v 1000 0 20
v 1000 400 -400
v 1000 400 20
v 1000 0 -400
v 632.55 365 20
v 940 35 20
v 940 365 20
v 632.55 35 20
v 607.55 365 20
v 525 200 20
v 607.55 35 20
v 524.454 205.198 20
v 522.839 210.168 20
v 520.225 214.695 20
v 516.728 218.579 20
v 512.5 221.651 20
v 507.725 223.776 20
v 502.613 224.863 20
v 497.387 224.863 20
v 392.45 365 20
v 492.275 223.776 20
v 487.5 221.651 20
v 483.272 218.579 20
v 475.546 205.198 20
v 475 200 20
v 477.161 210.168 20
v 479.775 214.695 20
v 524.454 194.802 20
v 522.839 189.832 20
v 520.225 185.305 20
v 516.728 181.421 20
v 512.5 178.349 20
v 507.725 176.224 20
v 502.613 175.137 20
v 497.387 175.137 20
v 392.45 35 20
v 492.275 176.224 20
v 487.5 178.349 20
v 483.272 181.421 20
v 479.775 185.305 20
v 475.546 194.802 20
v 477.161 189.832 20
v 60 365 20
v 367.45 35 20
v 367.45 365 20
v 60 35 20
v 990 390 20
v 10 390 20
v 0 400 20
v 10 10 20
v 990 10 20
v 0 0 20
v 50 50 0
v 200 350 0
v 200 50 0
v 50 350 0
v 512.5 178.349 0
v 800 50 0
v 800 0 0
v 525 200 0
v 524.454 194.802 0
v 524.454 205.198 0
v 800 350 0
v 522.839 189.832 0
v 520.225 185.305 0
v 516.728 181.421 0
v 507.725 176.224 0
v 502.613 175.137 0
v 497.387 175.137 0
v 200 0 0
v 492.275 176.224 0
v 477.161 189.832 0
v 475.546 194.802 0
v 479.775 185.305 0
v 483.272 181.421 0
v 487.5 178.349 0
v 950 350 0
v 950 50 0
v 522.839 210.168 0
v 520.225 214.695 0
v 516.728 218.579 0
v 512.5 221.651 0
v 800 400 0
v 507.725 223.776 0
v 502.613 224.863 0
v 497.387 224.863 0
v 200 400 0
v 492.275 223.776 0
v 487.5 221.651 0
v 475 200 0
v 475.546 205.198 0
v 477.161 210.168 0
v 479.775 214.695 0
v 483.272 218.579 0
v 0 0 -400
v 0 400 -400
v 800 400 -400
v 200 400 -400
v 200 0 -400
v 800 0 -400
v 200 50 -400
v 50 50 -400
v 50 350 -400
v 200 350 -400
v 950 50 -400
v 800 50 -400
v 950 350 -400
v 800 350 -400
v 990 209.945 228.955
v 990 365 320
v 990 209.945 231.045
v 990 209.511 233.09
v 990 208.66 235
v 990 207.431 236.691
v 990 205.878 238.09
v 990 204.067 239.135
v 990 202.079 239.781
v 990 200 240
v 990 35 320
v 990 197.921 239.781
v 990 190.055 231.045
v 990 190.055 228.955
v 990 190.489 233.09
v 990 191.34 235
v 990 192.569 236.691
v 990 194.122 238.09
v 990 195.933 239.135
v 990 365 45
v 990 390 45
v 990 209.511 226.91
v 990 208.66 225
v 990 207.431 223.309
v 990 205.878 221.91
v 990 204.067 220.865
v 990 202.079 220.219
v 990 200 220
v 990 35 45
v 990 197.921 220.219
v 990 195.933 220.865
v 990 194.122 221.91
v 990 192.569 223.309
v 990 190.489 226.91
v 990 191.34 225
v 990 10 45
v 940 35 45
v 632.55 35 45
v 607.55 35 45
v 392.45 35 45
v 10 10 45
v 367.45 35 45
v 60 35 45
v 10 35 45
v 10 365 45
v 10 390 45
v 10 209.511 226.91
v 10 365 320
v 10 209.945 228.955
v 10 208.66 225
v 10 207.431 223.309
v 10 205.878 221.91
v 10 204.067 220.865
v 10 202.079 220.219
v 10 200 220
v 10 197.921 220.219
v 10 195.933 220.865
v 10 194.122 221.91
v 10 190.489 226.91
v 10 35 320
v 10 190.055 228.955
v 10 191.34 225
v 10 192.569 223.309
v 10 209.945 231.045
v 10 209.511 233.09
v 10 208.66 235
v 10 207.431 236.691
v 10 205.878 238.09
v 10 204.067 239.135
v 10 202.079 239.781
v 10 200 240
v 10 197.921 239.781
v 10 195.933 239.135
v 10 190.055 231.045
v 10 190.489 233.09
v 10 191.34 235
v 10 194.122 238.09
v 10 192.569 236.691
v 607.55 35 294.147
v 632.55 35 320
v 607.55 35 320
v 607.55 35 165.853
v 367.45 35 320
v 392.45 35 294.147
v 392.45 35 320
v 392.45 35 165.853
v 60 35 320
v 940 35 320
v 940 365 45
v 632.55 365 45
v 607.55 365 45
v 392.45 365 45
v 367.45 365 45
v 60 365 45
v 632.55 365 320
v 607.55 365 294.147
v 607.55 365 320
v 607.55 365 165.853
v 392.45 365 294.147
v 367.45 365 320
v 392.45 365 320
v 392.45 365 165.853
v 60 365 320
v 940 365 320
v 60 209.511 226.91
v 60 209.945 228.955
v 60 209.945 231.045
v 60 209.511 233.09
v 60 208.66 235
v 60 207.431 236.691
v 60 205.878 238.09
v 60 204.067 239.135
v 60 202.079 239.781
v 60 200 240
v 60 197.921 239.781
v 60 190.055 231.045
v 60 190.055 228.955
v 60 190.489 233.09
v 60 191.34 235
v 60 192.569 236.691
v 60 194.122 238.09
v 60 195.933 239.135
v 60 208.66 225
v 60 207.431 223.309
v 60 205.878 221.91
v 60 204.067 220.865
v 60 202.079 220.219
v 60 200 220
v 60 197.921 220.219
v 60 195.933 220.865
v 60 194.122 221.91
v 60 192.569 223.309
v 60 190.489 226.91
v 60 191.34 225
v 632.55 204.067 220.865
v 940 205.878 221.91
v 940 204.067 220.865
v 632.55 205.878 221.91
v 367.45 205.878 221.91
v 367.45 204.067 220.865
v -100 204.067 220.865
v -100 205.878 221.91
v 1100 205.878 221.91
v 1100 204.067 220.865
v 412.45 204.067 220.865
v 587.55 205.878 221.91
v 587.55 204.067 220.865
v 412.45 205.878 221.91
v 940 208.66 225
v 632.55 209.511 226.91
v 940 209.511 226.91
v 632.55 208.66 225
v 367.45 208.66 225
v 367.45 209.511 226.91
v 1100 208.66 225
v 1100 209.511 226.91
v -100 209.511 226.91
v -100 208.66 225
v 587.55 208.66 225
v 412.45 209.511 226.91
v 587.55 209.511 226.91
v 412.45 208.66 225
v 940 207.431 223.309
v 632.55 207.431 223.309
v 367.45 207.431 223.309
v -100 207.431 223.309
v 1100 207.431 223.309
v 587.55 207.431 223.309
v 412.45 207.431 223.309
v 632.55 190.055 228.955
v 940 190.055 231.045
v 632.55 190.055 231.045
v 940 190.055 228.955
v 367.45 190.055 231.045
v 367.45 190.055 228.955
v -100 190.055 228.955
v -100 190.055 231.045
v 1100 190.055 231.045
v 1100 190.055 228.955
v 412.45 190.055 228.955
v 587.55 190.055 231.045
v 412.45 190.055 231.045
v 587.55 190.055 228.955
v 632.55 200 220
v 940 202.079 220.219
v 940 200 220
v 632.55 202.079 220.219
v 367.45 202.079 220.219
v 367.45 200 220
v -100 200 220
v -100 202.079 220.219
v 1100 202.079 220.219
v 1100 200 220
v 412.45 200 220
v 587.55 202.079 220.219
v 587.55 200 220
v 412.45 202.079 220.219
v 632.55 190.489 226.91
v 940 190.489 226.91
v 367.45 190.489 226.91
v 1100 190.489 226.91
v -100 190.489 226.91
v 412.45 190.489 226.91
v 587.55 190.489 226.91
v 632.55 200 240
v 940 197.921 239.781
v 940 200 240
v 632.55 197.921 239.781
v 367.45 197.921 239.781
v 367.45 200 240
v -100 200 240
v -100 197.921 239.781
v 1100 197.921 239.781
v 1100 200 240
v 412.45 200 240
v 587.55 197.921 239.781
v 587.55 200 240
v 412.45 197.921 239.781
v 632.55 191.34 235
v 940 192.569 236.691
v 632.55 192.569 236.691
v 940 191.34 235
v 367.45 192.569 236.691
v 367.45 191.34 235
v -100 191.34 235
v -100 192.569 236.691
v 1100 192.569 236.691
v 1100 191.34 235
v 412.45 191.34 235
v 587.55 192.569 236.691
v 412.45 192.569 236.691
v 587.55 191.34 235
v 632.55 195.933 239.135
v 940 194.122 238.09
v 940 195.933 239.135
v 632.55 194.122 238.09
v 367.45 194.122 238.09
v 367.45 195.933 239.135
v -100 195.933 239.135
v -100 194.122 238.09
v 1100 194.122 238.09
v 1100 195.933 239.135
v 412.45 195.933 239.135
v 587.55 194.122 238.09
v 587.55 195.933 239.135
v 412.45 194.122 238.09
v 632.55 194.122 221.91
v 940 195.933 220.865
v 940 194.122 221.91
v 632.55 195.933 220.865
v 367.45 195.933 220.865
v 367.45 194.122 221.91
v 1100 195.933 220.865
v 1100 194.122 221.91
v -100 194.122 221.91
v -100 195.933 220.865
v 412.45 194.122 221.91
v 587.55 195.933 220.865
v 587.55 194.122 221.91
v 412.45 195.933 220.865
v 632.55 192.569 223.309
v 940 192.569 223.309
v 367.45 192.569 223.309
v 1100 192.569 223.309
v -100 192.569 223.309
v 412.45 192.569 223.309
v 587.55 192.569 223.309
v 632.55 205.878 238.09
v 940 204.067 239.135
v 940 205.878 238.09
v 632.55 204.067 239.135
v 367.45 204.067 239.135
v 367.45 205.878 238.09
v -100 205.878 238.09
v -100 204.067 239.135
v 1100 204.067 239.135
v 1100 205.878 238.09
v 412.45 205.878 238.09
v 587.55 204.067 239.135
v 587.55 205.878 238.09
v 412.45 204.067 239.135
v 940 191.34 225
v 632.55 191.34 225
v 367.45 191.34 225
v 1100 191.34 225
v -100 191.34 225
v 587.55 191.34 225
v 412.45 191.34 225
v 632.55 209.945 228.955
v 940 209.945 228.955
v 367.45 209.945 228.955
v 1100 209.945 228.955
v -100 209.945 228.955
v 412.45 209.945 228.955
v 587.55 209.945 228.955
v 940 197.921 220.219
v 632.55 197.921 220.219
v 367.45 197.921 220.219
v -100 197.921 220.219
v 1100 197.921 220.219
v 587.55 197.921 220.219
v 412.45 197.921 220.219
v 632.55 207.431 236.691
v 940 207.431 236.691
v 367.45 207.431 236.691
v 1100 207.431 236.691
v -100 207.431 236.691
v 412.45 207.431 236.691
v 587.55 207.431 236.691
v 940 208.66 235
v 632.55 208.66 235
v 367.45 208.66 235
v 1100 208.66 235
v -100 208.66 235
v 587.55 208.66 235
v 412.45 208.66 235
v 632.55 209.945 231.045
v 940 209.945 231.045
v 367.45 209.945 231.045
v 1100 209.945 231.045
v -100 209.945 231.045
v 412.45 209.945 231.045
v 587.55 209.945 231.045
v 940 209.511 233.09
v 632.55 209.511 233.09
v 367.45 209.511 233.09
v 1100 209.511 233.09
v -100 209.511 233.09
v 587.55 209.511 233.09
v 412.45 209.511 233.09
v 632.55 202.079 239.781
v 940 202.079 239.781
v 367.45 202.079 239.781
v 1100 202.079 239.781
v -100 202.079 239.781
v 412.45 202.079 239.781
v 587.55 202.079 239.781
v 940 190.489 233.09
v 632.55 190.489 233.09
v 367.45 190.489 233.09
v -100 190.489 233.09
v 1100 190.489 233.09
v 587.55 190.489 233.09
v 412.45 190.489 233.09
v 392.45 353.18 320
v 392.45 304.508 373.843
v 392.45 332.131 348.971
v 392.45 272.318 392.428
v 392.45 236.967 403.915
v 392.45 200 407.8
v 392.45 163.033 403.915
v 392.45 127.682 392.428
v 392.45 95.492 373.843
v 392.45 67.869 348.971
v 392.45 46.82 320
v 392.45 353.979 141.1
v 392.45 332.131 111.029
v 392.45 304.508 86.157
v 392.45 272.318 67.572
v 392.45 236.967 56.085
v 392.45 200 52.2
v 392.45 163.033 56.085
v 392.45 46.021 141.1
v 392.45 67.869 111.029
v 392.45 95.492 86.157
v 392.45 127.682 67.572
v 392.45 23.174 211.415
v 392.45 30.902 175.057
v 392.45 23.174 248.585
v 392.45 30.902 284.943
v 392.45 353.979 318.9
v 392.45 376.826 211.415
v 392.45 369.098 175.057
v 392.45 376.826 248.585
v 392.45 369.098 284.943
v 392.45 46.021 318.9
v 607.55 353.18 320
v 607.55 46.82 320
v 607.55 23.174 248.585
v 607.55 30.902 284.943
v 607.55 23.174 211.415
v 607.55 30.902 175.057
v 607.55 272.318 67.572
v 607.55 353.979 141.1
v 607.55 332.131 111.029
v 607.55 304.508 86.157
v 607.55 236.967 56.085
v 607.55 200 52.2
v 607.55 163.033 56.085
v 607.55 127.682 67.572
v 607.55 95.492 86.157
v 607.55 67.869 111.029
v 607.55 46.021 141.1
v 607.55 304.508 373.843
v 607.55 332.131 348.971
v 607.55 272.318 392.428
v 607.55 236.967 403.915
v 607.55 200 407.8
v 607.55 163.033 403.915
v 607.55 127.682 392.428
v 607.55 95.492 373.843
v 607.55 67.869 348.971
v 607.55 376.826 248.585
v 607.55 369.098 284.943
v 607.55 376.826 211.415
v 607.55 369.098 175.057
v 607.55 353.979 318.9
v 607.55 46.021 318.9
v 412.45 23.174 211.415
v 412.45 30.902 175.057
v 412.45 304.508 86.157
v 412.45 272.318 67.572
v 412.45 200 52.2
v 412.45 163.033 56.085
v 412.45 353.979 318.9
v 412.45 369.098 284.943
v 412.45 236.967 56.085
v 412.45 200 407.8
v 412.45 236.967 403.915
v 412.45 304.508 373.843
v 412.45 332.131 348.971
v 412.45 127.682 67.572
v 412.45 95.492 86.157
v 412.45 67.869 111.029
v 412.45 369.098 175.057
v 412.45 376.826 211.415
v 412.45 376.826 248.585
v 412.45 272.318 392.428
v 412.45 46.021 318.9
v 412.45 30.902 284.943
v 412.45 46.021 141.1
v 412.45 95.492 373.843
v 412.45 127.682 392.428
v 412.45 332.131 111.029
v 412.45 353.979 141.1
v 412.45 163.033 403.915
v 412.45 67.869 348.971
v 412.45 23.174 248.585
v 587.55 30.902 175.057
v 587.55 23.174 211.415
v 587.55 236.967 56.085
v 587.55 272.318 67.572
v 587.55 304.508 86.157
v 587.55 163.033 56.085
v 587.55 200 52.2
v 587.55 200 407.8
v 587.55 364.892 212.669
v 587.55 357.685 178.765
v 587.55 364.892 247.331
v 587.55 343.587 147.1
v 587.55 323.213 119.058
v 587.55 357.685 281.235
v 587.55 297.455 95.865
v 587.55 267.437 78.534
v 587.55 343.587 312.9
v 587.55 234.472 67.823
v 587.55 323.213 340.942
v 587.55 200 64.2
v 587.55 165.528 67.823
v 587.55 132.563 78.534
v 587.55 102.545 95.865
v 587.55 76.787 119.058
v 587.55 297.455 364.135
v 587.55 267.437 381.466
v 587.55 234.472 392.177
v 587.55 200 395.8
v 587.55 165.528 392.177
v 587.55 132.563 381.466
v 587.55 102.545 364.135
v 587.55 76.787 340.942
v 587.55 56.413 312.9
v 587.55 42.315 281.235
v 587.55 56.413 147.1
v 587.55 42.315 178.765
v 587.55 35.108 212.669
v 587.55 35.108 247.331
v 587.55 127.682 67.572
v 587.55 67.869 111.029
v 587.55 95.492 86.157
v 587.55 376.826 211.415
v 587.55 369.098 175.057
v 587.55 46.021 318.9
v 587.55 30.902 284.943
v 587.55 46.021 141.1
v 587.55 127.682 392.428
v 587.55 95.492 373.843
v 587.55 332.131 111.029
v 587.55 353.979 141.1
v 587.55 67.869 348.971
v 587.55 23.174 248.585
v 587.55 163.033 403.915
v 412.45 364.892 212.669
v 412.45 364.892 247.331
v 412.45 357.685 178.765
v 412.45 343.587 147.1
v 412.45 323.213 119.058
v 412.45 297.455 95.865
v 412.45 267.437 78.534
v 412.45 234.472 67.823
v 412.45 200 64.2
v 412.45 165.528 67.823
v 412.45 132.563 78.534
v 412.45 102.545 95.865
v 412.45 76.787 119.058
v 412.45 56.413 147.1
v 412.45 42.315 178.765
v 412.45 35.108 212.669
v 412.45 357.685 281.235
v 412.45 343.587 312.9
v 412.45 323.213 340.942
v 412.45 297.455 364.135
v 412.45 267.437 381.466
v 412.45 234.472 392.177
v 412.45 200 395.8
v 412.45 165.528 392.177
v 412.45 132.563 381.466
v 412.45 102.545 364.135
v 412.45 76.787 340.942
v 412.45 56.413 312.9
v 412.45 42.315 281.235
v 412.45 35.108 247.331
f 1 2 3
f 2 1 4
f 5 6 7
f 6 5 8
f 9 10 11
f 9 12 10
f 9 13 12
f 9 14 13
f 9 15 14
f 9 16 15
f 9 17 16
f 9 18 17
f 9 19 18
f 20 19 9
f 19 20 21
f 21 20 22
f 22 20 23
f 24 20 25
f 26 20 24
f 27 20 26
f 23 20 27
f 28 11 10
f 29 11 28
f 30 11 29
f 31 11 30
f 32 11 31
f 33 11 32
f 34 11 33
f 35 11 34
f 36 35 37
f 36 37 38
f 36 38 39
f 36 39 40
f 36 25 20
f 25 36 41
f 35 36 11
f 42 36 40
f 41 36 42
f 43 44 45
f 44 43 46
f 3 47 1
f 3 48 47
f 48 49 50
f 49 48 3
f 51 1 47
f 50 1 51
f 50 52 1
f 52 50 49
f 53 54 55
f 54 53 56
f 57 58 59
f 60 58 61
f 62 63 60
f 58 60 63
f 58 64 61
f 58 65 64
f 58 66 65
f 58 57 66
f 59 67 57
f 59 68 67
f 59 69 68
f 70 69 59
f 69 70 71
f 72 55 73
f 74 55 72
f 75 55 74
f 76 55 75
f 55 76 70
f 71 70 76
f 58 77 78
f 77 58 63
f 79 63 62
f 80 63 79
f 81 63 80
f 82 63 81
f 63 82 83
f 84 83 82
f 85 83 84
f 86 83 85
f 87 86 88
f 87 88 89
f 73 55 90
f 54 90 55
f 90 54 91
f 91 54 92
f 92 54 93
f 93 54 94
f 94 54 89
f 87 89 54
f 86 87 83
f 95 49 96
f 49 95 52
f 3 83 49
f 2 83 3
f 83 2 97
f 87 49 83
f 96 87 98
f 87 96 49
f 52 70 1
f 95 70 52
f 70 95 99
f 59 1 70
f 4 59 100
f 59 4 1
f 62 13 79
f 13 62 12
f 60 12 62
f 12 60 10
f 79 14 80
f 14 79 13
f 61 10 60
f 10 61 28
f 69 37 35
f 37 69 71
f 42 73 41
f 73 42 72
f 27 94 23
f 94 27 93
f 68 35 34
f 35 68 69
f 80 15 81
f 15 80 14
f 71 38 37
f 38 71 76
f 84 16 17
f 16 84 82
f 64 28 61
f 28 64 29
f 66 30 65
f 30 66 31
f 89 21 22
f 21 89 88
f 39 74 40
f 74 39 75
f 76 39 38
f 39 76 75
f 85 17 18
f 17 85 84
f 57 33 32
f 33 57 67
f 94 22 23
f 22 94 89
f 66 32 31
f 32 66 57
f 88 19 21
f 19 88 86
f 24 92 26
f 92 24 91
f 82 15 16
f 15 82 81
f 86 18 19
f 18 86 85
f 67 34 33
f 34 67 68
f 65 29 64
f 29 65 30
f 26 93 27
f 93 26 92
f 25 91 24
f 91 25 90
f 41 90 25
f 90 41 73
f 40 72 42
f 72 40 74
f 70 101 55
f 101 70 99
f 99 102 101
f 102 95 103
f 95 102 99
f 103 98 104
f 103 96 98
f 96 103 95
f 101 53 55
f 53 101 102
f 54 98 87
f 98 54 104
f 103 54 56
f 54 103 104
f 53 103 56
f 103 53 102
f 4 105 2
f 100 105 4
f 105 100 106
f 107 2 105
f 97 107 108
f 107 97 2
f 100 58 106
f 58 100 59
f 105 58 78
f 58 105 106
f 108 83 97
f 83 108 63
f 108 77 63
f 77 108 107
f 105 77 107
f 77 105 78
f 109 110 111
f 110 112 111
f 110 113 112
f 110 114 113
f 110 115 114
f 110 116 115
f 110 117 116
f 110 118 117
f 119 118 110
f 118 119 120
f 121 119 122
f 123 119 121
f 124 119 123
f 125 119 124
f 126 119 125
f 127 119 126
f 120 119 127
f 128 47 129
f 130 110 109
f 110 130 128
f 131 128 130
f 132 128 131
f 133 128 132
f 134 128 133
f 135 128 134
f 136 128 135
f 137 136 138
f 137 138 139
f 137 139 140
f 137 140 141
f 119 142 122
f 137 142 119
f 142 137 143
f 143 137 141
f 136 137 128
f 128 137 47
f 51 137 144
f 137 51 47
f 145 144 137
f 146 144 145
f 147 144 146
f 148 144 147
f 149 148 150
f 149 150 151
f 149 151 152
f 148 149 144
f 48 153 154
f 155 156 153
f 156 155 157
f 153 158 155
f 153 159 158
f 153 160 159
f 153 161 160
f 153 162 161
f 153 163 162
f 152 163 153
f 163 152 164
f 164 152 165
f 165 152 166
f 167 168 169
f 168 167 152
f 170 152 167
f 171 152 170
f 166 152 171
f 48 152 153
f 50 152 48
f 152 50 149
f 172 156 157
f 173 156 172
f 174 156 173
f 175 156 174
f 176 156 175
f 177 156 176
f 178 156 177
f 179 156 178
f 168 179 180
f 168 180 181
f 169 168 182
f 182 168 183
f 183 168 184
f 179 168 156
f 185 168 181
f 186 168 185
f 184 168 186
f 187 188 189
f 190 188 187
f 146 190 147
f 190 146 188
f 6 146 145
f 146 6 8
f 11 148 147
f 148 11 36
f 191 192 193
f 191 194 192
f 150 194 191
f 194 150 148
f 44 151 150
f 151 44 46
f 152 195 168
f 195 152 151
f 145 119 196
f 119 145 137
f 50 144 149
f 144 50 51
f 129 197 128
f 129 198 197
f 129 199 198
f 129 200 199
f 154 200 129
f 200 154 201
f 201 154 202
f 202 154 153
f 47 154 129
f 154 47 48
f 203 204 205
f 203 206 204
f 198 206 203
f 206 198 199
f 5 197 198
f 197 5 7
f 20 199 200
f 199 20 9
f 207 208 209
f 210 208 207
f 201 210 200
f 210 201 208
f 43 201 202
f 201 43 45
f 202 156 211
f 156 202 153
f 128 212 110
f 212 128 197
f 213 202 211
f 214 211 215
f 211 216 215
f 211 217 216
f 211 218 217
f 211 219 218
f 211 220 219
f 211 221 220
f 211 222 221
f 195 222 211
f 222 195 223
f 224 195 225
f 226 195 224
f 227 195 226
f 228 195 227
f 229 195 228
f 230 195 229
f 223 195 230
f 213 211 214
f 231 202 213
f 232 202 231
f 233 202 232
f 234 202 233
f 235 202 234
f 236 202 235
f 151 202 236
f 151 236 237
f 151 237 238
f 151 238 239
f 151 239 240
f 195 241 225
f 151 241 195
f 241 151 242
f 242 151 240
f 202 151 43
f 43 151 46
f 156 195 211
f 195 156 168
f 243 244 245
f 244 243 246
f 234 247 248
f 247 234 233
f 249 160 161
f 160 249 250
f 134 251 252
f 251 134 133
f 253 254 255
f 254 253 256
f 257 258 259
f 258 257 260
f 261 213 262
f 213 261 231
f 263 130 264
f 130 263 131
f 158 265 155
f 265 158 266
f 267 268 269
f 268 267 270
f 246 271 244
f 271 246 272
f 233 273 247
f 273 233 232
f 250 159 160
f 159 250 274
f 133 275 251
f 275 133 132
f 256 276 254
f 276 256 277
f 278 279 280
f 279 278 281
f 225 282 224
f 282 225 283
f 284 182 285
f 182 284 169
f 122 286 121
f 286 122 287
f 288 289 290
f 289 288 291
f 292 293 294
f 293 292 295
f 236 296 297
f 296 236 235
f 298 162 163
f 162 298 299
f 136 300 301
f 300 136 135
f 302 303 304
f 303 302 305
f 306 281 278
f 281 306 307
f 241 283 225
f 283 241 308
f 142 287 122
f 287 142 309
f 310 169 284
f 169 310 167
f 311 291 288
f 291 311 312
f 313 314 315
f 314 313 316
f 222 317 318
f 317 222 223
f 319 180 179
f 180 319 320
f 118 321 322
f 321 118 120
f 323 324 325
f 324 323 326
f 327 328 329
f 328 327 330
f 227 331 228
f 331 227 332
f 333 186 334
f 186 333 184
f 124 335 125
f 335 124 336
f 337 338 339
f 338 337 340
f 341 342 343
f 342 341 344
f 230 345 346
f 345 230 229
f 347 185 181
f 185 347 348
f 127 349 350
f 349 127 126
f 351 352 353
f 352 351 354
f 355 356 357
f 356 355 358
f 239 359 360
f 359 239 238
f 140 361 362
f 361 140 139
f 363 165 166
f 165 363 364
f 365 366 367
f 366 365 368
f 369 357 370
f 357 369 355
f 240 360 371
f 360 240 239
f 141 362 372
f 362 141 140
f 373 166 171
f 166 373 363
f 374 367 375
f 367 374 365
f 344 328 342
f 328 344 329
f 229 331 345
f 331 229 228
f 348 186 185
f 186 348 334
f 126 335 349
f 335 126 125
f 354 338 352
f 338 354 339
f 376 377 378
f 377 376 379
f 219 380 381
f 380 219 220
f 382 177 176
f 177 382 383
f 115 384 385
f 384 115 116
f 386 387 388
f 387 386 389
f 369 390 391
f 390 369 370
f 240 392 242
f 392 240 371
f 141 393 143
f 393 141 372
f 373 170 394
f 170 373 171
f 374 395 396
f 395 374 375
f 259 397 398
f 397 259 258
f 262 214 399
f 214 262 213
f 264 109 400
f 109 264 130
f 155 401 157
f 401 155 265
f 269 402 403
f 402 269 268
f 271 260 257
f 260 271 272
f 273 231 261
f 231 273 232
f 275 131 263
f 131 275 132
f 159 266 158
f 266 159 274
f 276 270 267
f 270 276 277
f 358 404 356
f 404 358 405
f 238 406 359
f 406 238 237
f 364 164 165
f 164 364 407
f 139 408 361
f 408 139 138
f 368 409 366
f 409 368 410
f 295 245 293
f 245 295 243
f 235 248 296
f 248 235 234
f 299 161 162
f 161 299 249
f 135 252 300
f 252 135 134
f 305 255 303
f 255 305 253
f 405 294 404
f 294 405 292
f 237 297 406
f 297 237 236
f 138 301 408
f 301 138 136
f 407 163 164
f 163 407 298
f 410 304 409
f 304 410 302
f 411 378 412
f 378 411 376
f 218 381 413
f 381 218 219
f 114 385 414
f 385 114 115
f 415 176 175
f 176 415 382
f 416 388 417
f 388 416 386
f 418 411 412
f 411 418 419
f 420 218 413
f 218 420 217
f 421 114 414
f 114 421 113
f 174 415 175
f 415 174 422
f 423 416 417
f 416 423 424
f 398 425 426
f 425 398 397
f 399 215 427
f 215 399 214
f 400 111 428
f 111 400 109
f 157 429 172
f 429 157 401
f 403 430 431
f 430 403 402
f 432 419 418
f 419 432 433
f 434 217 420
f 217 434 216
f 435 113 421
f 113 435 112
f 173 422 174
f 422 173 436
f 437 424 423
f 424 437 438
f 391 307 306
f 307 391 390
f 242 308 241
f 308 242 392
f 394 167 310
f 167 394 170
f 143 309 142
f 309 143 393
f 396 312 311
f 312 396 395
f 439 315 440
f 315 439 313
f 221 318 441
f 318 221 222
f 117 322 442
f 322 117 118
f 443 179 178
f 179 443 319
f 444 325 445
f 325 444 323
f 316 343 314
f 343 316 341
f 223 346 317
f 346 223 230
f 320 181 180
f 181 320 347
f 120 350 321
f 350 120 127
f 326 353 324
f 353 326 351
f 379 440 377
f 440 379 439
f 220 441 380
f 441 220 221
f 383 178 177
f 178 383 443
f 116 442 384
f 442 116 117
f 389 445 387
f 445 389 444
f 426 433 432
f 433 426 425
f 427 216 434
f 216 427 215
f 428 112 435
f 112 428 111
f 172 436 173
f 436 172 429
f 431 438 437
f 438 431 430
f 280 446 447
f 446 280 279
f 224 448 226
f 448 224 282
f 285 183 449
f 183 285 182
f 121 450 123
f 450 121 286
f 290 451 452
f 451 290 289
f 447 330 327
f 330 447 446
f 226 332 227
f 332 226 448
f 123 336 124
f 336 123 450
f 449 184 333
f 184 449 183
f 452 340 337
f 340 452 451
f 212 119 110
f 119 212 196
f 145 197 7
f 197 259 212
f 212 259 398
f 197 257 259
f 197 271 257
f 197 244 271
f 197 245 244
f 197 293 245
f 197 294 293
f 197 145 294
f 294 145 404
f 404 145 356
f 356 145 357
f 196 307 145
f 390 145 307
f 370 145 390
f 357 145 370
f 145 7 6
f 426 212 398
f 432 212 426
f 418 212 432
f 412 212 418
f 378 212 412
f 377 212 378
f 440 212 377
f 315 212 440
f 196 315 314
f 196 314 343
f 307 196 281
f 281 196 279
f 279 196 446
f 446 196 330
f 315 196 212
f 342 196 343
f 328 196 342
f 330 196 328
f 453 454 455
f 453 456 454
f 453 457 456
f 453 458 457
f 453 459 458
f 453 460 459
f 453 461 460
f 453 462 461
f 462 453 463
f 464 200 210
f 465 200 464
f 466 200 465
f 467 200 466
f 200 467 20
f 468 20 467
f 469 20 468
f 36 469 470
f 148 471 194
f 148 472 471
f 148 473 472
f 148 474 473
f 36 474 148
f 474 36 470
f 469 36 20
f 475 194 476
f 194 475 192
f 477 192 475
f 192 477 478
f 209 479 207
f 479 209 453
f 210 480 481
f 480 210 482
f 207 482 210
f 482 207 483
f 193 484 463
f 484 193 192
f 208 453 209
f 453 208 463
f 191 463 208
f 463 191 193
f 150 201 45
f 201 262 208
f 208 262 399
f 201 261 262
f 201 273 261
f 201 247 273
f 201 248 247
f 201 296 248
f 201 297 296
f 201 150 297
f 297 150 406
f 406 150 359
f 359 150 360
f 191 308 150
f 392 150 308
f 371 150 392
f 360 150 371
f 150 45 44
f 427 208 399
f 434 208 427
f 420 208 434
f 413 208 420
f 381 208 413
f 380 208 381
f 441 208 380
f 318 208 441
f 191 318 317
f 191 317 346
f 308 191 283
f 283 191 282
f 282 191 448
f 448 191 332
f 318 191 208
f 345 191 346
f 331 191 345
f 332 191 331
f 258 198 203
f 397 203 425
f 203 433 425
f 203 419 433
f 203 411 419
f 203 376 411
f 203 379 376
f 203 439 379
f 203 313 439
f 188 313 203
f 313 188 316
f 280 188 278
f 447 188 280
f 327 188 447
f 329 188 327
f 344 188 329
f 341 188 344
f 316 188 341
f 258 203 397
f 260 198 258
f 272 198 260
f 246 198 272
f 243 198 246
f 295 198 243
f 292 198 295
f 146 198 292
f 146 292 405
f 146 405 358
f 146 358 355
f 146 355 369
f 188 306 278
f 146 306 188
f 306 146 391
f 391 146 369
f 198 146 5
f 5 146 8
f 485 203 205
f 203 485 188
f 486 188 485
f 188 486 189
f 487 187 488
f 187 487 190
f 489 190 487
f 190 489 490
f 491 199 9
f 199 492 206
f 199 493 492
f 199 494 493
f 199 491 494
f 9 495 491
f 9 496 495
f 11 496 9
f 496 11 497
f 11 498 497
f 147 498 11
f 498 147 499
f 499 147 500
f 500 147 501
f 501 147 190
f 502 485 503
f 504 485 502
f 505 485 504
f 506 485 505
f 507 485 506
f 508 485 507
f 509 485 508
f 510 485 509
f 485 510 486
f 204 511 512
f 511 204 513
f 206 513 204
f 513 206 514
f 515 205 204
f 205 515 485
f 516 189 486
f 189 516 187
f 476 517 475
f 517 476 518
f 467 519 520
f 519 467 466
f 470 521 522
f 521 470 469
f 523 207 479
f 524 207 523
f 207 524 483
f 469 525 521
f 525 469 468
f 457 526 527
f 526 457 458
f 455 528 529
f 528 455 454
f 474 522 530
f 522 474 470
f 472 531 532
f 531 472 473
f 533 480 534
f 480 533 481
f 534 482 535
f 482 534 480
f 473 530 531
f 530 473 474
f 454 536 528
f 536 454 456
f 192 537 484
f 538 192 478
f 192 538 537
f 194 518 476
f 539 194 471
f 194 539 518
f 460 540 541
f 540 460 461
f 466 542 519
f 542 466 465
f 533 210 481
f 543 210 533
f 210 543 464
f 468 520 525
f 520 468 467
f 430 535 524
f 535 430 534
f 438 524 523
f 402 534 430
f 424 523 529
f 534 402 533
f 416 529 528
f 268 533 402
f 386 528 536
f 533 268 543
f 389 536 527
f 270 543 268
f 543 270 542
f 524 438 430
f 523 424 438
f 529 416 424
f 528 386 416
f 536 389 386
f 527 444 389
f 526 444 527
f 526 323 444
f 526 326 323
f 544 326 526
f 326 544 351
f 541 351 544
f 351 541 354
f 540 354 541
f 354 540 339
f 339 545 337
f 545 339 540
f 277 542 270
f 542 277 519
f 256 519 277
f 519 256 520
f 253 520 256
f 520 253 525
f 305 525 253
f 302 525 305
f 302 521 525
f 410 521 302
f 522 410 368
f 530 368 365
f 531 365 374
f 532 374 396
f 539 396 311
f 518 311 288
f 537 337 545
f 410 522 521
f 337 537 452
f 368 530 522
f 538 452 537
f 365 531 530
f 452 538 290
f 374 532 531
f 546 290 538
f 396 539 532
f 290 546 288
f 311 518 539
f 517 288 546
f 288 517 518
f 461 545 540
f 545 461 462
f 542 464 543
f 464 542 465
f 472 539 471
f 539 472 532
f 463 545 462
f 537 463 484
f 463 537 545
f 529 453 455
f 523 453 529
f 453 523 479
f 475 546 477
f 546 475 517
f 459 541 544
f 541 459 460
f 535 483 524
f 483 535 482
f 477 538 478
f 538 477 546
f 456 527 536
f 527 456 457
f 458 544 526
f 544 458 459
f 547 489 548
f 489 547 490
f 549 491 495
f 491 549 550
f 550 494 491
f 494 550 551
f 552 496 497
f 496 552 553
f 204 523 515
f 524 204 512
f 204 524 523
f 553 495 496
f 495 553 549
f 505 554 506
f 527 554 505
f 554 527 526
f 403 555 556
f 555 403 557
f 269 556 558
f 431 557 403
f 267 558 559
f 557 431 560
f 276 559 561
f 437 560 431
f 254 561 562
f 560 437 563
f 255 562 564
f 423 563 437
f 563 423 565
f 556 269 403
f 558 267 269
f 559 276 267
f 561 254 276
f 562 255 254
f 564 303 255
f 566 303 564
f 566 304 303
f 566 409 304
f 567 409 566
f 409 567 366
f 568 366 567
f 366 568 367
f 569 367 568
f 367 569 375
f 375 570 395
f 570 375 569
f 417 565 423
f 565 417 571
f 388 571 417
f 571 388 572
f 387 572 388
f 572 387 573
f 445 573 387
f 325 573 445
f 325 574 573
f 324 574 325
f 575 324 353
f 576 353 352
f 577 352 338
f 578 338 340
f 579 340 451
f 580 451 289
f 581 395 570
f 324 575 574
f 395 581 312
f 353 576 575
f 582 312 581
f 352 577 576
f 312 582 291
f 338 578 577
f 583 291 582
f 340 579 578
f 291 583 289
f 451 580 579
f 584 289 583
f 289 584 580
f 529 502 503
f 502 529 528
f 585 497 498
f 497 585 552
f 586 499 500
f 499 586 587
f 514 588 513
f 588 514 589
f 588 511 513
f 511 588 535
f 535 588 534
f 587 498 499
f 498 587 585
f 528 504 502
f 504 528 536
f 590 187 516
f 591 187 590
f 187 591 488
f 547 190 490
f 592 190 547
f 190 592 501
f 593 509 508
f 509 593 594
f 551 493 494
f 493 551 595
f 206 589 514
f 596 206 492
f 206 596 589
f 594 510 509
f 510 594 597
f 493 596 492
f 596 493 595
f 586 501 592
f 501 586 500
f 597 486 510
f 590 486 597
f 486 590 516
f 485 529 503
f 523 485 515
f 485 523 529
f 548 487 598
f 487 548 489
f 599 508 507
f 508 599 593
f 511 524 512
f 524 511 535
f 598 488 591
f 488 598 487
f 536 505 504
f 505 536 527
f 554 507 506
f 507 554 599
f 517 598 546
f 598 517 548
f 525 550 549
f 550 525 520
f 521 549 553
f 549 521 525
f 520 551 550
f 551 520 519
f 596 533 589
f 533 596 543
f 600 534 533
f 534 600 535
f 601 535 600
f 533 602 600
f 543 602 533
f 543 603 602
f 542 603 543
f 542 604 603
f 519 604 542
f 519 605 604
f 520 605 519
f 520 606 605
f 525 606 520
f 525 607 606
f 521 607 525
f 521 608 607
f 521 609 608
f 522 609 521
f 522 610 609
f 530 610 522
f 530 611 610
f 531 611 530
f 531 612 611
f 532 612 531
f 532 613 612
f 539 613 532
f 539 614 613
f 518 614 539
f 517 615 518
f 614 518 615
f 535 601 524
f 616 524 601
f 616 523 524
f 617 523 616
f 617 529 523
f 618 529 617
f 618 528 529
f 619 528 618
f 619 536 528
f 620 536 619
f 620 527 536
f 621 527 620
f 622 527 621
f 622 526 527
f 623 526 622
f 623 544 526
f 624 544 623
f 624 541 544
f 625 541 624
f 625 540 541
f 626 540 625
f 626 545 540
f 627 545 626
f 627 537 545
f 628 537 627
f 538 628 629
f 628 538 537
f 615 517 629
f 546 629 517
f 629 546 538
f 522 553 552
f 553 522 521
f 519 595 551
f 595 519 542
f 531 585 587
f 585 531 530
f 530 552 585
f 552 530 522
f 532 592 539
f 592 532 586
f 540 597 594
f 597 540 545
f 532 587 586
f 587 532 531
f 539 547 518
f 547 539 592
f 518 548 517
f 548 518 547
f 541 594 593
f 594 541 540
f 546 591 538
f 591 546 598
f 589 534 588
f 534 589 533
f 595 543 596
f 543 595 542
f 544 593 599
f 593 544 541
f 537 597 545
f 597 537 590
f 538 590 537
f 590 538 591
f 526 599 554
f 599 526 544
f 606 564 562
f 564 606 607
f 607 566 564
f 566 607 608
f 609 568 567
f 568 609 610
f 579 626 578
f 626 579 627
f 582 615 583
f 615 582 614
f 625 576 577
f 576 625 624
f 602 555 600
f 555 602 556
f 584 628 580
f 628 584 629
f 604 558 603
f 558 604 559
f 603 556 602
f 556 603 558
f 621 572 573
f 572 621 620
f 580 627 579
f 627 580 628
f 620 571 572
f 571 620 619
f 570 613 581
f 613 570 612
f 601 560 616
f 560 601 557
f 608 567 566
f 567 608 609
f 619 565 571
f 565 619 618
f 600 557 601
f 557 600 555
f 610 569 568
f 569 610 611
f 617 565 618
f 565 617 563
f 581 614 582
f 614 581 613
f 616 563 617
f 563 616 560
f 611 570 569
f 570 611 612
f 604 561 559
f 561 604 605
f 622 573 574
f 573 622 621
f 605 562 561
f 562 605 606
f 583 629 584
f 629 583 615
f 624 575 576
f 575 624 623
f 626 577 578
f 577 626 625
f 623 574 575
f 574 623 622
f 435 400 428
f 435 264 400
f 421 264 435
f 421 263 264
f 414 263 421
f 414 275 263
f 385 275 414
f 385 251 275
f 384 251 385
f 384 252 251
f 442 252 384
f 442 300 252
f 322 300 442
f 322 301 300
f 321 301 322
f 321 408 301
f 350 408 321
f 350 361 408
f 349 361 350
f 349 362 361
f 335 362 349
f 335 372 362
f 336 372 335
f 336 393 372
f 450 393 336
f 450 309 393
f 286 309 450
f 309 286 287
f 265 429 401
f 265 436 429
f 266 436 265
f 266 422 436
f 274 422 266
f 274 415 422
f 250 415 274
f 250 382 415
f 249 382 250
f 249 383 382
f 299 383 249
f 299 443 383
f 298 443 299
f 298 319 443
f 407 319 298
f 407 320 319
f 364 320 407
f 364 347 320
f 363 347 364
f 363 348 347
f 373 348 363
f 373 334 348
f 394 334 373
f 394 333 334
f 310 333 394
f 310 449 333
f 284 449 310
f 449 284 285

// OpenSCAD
module base()
{
	// Base board
	difference() {
		color([0, 0, 0])
			cube([1000, 400, 20]);

		// Hole for cutter head
		translate([500, 200, 0])
			cylinder(40, 25, 25, true);
	}

	// Sockets at the bottom of the board
	translate([0, 0, -400])
		color([1.0, 1.0, 1.0])
		cube([200, 50, 400]);
	translate([0, 350, -400])
		color([1.0, 1.0, 1.0])
		cube([200, 50, 400]);
	translate([50, 50, -400])
		rotate(90)
		color([1.0, 1.0, 1.0])
		cube([300, 50, 400]);

	translate([800, 0, -400])
		color([1.0, 1.0, 1.0])
		cube([200, 50, 400]);
	translate([800, 350, -400])
		color([1.0, 1.0, 1.0])
		cube([200, 50, 400]);
	translate([1000, 50, -400])
		rotate(90)
		color([1.0, 1.0, 1.0])
		cube([300, 50, 400]);

	// Runners for shell mount
	translate([10, 10, 20])
		color([1, 1, 1])
		cube([980, 25, 25]);
	translate([10, 365, 20])
		color([1, 1, 1])
		cube([980, 25, 25]);
}

module rod_mount()
{
	// Outer mounts for the threaded rod
	difference() {
		translate([10, 35, 20])
			color([0.8, 0.6, 0.5])
			cube([50, 330, 300]);

		translate([0, 200, 230])
			rotate([0, 90, 0])
			cylinder(70, 10, 10);
	}
	difference() {
		translate([940, 35, 20])
			color([0.8, 0.6, 0.5])
			cube([50, 330, 300]);

		translate([930, 200, 230])
			rotate([0, 90, 0])
			cylinder(70, 10, 10);
	}
}

module rod()
{
	translate([-100, 200, 230])
		rotate([0, 90, 0])
		color([0.5, 0.5, 0.5])
		cylinder(1200, 10, 10);
}

module shell()
{
	// Example drum shell (14"x6.5")
	d = 14 * 2.54 * 10;
	h = 6.5 * 2.54 * 10 + 10;

	translate([500, 200, 230])
	rotate([0, 90, 0])
	difference() {
		cylinder(h, d / 2, d / 2, true);
		cylinder(h + 20, d / 2 - 12, d / 2 - 12, true);
	}
}

module shell_mount()
{
	// Runners for the shell
	difference() {
		translate([367.45, 35, 20])
			color([0.8, 0.6, 0.5])
			cube([25, 330, 300]);

		translate([357.45, 200, 230])
			rotate([0, 90, 0])
			cylinder(45, 10, 10);
	}
	difference() {
		translate([607.55, 35, 20])
			color([0.8, 0.6, 0.5])
			cube([25, 330, 300]);

		translate([597.55, 200, 230])
			rotate([0, 90, 0])
			cylinder(45, 10, 10);
	}


	d = 14 * 2.54 * 10;

	// Round plates to mount the drum shell
	// Example drum shell (14"x6.5")
	translate([402.45, 200, 230])
		rotate([0, 90, 0])
		color([1, 1, 1])
		cylinder(20, d / 2, d / 2, true);
	translate([597.55, 200, 230])
		rotate([0, 90, 0])
		color([1, 1, 1])
		cylinder(20, d / 2, d / 2, true);
}

base();
rod_mount();
shell_mount();
rod();
shell();
